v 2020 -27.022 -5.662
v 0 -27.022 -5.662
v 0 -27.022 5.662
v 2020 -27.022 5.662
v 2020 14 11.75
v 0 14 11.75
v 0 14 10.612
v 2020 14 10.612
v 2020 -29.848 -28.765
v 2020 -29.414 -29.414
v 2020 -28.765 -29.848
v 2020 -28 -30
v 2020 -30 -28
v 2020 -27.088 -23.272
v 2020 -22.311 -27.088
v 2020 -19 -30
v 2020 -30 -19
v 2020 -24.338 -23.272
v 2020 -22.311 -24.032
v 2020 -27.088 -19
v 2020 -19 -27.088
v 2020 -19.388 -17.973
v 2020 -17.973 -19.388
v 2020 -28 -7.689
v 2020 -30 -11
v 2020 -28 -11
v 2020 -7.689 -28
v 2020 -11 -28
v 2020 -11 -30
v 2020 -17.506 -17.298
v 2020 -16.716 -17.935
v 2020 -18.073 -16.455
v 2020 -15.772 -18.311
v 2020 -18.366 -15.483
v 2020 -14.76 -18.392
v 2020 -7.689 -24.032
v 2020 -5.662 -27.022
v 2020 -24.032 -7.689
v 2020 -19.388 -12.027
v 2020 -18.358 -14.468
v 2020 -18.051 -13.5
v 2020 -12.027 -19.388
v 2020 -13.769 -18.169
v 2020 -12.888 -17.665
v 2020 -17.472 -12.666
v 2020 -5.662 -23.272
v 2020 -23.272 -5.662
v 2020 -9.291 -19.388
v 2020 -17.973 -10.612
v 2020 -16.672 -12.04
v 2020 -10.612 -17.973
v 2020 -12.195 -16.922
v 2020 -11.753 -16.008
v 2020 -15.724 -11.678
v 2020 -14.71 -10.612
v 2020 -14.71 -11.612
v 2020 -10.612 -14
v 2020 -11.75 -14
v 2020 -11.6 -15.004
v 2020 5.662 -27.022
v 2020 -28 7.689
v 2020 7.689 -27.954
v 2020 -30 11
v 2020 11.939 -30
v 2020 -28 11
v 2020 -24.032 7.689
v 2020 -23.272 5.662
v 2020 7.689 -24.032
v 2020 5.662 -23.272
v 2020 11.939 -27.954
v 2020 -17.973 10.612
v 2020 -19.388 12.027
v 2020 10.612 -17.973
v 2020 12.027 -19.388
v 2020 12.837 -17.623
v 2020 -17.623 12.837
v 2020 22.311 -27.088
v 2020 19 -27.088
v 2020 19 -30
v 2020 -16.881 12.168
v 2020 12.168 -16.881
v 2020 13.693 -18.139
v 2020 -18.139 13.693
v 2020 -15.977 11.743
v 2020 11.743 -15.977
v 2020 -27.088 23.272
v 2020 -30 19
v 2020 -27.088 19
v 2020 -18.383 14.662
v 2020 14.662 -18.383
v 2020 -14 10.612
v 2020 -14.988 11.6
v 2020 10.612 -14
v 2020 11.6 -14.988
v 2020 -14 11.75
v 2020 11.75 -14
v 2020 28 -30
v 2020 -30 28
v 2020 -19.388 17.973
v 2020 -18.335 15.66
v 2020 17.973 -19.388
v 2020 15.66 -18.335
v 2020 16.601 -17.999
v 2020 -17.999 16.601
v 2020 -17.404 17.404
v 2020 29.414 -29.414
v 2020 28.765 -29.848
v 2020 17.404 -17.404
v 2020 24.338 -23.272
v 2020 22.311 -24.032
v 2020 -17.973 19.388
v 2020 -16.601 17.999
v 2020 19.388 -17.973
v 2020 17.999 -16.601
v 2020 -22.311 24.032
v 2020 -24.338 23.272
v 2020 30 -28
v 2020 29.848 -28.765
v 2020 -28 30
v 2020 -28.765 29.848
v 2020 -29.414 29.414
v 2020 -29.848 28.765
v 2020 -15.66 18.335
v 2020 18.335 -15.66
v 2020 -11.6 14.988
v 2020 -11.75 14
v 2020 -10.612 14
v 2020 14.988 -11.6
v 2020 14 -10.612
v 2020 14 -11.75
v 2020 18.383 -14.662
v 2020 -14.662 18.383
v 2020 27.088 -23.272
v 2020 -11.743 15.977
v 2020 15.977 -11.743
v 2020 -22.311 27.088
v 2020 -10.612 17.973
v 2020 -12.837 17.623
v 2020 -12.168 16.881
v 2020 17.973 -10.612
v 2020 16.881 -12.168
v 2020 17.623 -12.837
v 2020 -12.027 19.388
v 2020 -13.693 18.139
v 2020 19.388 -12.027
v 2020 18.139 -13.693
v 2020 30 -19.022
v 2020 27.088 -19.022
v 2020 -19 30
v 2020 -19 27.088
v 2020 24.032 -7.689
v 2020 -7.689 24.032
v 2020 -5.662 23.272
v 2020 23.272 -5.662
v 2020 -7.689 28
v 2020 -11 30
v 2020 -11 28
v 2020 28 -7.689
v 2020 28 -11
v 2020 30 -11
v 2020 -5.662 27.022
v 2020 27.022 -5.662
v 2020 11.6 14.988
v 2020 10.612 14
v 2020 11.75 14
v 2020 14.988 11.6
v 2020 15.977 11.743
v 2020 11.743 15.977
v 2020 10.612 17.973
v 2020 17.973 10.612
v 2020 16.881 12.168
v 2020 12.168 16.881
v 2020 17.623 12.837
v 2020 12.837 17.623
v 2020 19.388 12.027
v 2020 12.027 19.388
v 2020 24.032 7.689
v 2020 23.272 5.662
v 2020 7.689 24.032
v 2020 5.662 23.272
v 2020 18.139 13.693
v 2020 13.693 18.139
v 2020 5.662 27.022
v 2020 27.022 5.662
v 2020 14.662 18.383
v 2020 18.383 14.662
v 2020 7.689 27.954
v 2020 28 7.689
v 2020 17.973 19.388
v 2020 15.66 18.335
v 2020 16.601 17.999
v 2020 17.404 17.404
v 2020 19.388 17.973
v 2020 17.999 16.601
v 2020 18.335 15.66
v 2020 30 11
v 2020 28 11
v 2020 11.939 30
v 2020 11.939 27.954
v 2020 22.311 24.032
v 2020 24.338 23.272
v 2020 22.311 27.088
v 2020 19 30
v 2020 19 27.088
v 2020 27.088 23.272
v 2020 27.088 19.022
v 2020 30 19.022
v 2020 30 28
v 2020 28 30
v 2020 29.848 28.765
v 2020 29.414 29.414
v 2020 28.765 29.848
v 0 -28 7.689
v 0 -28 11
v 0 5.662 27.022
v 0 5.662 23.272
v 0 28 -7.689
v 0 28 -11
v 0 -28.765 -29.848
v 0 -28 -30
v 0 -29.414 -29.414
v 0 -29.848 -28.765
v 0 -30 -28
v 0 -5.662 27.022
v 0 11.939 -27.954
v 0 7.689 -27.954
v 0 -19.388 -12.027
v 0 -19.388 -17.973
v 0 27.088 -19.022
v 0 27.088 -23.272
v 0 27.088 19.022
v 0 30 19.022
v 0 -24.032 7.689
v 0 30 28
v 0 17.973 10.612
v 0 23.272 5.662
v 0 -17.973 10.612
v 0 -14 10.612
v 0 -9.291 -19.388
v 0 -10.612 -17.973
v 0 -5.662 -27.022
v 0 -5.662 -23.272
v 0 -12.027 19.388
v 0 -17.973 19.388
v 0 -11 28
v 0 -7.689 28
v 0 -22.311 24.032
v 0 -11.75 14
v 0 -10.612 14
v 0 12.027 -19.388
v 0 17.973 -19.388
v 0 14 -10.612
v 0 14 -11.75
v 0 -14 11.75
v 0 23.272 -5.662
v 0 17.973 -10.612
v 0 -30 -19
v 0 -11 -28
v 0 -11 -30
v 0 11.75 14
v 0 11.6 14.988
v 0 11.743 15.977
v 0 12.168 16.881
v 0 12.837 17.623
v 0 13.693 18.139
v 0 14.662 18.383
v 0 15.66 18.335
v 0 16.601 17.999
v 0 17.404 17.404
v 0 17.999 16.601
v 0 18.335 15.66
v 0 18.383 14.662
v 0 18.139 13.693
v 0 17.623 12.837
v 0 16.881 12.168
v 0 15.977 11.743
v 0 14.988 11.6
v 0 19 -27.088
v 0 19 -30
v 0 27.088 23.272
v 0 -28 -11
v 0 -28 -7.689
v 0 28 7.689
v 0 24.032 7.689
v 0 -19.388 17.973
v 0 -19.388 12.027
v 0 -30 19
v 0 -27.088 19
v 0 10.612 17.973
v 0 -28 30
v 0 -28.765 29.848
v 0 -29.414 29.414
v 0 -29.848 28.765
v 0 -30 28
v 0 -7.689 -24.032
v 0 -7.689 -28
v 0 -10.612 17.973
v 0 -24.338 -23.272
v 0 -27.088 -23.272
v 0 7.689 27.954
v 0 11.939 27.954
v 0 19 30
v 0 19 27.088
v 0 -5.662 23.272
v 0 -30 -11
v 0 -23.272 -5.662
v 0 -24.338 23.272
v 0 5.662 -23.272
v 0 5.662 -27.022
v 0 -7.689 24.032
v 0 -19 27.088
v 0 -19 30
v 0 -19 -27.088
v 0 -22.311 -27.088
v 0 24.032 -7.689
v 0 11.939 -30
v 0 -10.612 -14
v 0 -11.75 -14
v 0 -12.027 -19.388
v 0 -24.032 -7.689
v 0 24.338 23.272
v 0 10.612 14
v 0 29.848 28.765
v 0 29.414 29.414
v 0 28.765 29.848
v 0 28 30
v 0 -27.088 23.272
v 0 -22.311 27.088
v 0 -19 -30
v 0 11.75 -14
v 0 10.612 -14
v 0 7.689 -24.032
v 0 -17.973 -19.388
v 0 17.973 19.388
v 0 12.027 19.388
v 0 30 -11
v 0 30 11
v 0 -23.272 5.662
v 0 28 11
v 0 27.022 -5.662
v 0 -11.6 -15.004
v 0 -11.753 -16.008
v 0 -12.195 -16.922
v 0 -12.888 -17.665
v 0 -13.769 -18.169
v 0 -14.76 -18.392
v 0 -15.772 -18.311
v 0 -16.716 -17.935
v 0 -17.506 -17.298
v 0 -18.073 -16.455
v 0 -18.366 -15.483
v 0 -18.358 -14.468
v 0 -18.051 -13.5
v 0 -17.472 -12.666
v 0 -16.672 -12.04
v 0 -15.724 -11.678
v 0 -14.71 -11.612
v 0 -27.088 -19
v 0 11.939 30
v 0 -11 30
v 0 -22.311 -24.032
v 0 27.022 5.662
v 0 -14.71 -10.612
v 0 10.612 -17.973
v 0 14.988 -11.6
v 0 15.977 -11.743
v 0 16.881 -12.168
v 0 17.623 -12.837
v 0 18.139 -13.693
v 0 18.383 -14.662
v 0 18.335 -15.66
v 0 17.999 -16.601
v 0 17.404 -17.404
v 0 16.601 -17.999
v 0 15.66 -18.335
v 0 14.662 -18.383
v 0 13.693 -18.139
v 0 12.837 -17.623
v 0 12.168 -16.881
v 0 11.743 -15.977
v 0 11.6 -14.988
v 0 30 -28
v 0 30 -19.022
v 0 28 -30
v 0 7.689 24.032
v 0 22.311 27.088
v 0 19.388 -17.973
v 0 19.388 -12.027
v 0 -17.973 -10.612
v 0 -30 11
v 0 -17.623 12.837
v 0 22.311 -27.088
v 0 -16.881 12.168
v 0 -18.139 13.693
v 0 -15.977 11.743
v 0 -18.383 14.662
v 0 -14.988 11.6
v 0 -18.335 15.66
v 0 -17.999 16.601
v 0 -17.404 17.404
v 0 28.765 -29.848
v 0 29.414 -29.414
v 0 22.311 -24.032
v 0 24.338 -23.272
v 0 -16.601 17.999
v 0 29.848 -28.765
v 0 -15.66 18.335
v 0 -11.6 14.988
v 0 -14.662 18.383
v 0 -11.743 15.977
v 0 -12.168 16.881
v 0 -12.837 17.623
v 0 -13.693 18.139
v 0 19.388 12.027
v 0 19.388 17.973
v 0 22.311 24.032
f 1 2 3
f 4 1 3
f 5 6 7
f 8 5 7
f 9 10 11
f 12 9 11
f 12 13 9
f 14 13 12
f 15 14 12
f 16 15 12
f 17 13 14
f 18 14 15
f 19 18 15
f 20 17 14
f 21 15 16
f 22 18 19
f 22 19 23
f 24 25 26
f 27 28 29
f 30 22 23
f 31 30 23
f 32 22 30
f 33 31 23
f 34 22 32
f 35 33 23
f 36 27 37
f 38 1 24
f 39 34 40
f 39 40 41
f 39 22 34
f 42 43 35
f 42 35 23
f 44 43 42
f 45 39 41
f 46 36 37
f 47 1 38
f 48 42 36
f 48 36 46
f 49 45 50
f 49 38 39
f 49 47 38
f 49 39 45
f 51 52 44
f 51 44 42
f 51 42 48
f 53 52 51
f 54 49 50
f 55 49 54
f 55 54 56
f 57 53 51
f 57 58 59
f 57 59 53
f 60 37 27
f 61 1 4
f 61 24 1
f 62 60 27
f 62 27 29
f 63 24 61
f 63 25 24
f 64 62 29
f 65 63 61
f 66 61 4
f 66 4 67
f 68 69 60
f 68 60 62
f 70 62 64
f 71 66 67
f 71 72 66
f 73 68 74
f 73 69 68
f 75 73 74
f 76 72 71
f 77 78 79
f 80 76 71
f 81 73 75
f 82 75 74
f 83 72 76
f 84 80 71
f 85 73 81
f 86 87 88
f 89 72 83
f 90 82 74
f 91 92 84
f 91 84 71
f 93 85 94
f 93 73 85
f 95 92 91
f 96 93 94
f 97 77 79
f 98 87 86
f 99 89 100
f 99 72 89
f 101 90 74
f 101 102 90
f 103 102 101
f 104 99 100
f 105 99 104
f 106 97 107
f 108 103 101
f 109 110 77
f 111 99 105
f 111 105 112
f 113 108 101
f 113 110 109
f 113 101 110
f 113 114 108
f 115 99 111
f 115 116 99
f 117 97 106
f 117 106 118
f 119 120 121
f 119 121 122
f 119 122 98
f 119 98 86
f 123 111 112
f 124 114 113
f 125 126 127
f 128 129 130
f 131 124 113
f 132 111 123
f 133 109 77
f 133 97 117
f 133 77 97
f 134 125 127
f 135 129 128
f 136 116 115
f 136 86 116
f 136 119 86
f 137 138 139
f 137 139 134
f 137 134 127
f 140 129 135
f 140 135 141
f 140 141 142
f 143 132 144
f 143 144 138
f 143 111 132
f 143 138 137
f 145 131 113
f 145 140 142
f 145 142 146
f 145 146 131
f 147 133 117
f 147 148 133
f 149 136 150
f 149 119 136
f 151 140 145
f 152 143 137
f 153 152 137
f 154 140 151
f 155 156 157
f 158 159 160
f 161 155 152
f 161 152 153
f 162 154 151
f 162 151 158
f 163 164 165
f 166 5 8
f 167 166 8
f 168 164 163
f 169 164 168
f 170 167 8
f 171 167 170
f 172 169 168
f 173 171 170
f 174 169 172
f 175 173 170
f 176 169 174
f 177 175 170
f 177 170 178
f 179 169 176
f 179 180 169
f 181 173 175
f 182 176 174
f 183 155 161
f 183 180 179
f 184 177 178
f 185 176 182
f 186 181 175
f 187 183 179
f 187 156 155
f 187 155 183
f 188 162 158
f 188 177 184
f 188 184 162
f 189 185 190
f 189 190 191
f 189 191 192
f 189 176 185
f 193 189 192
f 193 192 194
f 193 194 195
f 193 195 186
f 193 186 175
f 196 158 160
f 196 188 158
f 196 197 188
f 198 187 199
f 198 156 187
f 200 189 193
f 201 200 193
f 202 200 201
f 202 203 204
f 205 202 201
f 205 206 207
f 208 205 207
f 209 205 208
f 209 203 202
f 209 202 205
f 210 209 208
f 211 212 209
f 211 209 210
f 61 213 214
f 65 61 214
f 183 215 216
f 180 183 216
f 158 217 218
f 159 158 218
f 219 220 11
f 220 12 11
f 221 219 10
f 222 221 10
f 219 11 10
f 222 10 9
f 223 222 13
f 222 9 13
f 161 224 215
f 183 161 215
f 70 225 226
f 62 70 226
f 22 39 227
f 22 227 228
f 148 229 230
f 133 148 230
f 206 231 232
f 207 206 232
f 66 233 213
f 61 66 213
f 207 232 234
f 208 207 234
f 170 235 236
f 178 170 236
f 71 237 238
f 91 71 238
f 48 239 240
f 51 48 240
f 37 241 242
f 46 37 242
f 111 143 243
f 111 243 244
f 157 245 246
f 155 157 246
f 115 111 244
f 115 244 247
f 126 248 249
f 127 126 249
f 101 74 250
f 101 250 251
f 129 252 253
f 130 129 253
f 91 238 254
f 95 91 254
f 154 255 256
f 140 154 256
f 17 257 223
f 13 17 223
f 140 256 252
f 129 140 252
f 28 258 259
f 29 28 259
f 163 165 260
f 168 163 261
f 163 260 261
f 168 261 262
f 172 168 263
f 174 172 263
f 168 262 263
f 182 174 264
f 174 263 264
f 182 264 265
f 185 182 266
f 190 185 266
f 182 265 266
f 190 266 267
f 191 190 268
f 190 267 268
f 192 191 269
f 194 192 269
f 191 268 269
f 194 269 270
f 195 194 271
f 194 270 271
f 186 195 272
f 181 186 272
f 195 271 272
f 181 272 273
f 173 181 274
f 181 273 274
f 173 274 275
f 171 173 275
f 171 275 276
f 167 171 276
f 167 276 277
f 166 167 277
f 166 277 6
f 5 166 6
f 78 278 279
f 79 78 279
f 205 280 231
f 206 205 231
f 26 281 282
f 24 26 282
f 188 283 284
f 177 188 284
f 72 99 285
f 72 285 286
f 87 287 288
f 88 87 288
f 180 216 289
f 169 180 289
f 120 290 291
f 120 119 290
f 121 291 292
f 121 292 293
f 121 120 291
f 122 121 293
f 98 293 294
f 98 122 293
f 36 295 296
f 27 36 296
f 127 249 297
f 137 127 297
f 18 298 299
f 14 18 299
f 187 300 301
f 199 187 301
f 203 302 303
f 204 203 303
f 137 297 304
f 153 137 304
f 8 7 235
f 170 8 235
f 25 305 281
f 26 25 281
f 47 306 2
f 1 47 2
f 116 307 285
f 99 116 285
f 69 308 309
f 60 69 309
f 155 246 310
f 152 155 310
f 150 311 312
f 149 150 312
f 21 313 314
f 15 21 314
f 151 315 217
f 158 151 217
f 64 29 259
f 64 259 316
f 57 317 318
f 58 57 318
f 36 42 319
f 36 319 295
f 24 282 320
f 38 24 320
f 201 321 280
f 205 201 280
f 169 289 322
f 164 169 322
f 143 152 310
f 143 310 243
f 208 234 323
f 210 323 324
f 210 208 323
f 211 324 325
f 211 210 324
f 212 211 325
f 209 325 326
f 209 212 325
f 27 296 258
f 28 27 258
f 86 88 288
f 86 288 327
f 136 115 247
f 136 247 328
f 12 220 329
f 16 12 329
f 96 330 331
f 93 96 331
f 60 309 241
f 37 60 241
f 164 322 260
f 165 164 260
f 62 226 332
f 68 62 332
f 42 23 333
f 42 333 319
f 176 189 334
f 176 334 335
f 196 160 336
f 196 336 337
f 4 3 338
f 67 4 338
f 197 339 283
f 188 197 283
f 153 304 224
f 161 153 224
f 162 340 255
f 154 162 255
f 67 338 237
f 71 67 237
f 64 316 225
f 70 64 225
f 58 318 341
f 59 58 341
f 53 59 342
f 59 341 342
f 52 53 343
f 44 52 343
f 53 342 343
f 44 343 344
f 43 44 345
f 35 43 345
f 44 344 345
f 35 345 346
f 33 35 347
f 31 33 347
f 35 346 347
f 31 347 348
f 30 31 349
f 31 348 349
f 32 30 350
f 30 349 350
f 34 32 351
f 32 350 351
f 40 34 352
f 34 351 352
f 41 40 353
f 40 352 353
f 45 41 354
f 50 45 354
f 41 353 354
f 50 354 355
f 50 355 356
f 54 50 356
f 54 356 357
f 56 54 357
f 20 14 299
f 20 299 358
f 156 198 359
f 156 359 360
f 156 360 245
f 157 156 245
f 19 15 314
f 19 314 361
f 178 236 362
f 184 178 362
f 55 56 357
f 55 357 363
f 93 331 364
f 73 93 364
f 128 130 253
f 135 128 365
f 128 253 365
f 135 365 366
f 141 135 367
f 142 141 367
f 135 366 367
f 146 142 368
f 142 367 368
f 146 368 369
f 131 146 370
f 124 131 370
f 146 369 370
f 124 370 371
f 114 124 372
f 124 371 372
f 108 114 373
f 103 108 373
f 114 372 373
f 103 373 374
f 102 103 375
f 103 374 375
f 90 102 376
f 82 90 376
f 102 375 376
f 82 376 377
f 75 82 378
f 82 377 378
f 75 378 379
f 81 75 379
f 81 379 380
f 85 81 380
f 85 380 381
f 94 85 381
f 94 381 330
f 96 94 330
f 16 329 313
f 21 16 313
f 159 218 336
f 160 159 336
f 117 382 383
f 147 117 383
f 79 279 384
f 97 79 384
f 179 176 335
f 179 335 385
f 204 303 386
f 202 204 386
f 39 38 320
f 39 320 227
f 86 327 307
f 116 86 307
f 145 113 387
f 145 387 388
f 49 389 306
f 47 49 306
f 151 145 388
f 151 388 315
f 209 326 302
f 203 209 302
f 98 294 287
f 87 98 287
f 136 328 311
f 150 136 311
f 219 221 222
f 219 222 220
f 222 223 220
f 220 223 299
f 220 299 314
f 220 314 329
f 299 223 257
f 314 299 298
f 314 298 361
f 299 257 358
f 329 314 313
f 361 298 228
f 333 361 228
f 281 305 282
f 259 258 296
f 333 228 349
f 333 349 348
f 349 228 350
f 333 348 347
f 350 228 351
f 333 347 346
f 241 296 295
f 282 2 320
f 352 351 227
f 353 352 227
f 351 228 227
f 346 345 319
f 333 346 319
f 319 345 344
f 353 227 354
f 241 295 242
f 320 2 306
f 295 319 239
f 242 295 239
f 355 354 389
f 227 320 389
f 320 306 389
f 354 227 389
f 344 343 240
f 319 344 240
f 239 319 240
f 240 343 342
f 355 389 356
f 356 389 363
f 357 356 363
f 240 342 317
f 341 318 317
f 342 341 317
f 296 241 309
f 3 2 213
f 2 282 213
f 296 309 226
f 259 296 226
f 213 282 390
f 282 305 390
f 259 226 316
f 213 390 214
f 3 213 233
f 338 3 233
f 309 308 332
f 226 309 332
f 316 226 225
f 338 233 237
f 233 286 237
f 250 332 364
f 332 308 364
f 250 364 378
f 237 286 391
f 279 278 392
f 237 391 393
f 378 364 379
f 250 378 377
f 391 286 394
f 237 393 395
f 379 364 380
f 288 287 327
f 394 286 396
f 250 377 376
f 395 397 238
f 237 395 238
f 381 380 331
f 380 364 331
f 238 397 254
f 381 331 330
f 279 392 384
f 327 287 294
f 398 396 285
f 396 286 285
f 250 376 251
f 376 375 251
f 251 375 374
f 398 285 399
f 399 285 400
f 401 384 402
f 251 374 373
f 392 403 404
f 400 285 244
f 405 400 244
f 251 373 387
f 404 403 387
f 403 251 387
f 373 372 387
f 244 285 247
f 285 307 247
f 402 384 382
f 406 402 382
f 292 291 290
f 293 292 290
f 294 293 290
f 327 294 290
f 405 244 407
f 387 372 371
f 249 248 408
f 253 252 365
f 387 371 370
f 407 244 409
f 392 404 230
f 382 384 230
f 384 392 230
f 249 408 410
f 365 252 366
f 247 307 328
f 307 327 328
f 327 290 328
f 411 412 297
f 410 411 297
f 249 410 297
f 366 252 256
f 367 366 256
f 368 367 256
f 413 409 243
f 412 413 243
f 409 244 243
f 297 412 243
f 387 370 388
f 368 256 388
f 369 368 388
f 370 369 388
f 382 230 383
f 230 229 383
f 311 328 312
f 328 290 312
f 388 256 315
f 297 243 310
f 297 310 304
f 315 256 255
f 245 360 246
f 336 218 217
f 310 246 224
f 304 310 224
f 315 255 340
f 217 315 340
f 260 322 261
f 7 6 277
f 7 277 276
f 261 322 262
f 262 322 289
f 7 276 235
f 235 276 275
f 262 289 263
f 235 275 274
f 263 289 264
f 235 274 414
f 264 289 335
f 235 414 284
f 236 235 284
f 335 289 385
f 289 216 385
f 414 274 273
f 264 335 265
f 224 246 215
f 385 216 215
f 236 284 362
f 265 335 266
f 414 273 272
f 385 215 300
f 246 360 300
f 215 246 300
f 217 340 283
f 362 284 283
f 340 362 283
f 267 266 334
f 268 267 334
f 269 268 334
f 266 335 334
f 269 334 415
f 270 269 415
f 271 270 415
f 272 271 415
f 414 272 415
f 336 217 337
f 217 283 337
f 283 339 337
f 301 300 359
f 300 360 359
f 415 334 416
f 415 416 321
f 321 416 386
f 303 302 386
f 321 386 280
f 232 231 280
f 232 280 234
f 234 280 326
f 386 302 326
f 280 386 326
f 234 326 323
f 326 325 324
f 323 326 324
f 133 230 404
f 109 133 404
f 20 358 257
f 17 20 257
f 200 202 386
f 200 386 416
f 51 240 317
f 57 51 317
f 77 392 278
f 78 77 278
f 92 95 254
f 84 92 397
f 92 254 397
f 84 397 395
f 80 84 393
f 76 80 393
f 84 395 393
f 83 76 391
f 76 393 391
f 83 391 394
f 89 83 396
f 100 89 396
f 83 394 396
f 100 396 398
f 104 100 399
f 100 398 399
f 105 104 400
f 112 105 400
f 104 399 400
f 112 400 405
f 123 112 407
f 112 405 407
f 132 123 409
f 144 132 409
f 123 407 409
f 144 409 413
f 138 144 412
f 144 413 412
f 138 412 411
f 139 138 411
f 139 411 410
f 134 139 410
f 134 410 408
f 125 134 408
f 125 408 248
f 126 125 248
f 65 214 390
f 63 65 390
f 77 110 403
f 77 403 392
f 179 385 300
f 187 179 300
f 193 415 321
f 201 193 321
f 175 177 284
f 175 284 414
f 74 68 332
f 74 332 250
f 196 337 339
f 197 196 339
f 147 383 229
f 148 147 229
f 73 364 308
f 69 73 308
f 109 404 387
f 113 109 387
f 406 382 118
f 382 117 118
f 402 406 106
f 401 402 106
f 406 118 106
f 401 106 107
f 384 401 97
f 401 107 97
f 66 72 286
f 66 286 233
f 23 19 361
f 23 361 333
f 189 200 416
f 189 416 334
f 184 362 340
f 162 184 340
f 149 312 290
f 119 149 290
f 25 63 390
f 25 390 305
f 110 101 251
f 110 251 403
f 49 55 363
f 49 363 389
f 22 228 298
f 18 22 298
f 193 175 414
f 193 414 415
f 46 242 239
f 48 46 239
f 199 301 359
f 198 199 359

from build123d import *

# Parameters (mm, degrees)
F1_DEPTH = 2020
F2_R     = 2


with BuildPart() as f1:
    # F0 (on Right) → F1 (new body)
    with BuildSketch(Plane.YZ):
        with BuildLine():
            Line((-10.612364, -17.972602), (-9.290568, -19.387636))
            Line((-9.290568, -19.387636), (-5.661865, -23.272303))
            Line((-5.661865, -23.272303), (-5.661865, -27.022303))
            Line((-5.661865, -27.022303), (5.661865, -27.022303))
            Line((5.661865, -27.022303), (5.661865, -23.272303))
            Line((5.661865, -23.272303), (10.612364, -17.972602))
            Line((10.612364, -17.972602), (10.612364, -14))
            Line((10.612364, -14), (11.750385, -14))
            ThreePointArc((11.750385, -14), (17.404163, -17.404163), (14, -11.750385))
            Line((14, -11.750385), (14, -10.612364))
            Line((14, -10.612364), (17.972602, -10.612364))
            Line((17.972602, -10.612364), (23.272303, -5.661865))
            Line((23.272303, -5.661865), (27.022303, -5.661865))
            Line((27.022303, -5.661865), (27.022303, 5.661865))
            Line((27.022303, 5.661865), (23.272303, 5.661865))
            Line((23.272303, 5.661865), (17.972602, 10.612364))
            Line((17.972602, 10.612364), (14, 10.612364))
            Line((14, 10.612364), (14, 11.750385))
            ThreePointArc((14, 11.750385), (17.404163, 17.404163), (11.750385, 14))
            Line((11.750385, 14), (10.612364, 14))
            Line((10.612364, 14), (10.612364, 17.972602))
            Line((10.612364, 17.972602), (5.661865, 23.272303))
            Line((5.661865, 23.272303), (5.661865, 27.022303))
            Line((5.661865, 27.022303), (-5.661865, 27.022303))
            Line((-5.661865, 27.022303), (-5.661865, 23.272303))
            Line((-5.661865, 23.272303), (-10.612364, 17.972602))
            Line((-10.612364, 17.972602), (-10.612364, 14))
            Line((-10.612364, 14), (-11.750385, 14))
            ThreePointArc((-11.750385, 14), (-17.404163, 17.404163), (-14, 11.750385))
            Line((-14, 11.750385), (-14, 10.612364))
            Line((-14, 10.612364), (-17.972602, 10.612364))
            Line((-17.972602, 10.612364), (-23.272303, 5.661865))
            Line((-23.272303, 5.661865), (-27.022303, 5.661865))
            Line((-27.022303, 5.661865), (-27.022303, -5.661865))
            Line((-27.022303, -5.661865), (-23.272303, -5.661865))
            Line((-23.272303, -5.661865), (-17.972602, -10.612364))
            Line((-17.972602, -10.612364), (-14.710301, -10.612364))
            Line((-14.710301, -10.612364), (-14.710301, -11.612364))
            ThreePointArc((-14.710301, -11.612364), (-17.134687, -17.646339), (-11.750385, -14))
            Line((-11.750385, -14), (-10.612364, -14))
            Line((-10.612364, -14), (-10.612364, -17.972602))
        make_face()
        Polygon((30, 19.022303), (30, 30), (19, 30), (19, 27.088135), (22.311088, 27.088135), (22.311088, 24.032154), (17.972602, 19.387636), (14.198971, 19.387636), (12.027398, 19.387636), (7.688912, 24.032154), (7.688912, 26.953727), (7.688912, 27.953727), (11.938912, 27.953727), (11.938912, 30), (-11, 30), (-11, 28), (-7.688912, 28), (-7.688912, 24.032154), (-12.027398, 19.387636), (-17.972602, 19.387636), (-22.311088, 24.032154), (-22.311088, 27.088135), (-19, 27.088135), (-19, 30), (-30, 30), (-30, 19), (-27.088135, 19), (-27.088135, 23.272303), (-24.338135, 23.272303), (-19.387636, 17.972602), (-19.387636, 12.027398), (-24.032154, 7.688912), (-28, 7.688912), (-28, 11), (-30, 11), (-30, -11), (-28, -11), (-28, -7.688912), (-24.032154, -7.688912), (-19.387636, -12.027398), (-19.387636, -17.972602), (-24.338135, -23.272303), (-27.088135, -23.272303), (-27.088135, -19), (-30, -19), (-30, -30), (-19, -30), (-19, -27.088135), (-22.311088, -27.088135), (-22.311088, -24.032154), (-17.972602, -19.387636), (-12.027398, -19.387636), (-7.688912, -24.032154), (-7.688912, -28), (-11, -28), (-11, -30), (11.938912, -30), (11.938912, -27.953727), (7.688912, -27.953727), (7.688912, -26.953727), (7.688912, -24.032154), (12.027398, -19.387636), (14.198971, -19.387636), (17.972602, -19.387636), (22.311088, -24.032154), (22.311088, -27.088135), (19, -27.088135), (19, -30), (30, -30), (30, -19.022303), (27.088135, -19.022303), (27.088135, -23.272303), (24.338135, -23.272303), (19.387636, -17.972602), (19.387636, -12.027398), (24.032154, -7.688912), (28, -7.688912), (28, -11), (30, -11), (30, 11), (28, 11), (28, 7.688912), (24.032154, 7.688912), (19.387636, 12.027398), (19.387636, 17.972602), (24.338135, 23.272303), (27.088135, 23.272303), (27.088135, 19.022303), align=None)
        with BuildLine():
            Line((-5.661865, -23.272303), (-9.290568, -19.387636))
            Line((-9.290568, -19.387636), (-10.612364, -17.972602))
            Line((-10.612364, -17.972602), (-10.612364, -14))
            Line((-10.612364, -14), (-11.750385, -14))
            ThreePointArc((-11.750385, -14), (-17.134687, -17.646339), (-14.710301, -11.612364))
            Line((-14.710301, -11.612364), (-14.710301, -10.612364))
            Line((-14.710301, -10.612364), (-17.972602, -10.612364))
            Line((-17.972602, -10.612364), (-23.272303, -5.661865))
            Line((-23.272303, -5.661865), (-27.022303, -5.661865))
            Line((-27.022303, -5.661865), (-27.022303, 5.661865))
            Line((-27.022303, 5.661865), (-23.272303, 5.661865))
            Line((-23.272303, 5.661865), (-17.972602, 10.612364))
            Line((-17.972602, 10.612364), (-14, 10.612364))
            Line((-14, 10.612364), (-14, 11.750385))
            ThreePointArc((-14, 11.750385), (-17.404163, 17.404163), (-11.750385, 14))
            Line((-11.750385, 14), (-10.612364, 14))
            Line((-10.612364, 14), (-10.612364, 17.972602))
            Line((-10.612364, 17.972602), (-5.661865, 23.272303))
            Line((-5.661865, 23.272303), (-5.661865, 27.022303))
            Line((-5.661865, 27.022303), (5.661865, 27.022303))
            Line((5.661865, 27.022303), (5.661865, 23.272303))
            Line((5.661865, 23.272303), (10.612364, 17.972602))
            Line((10.612364, 17.972602), (10.612364, 14))
            Line((10.612364, 14), (11.750385, 14))
            ThreePointArc((11.750385, 14), (17.404163, 17.404163), (14, 11.750385))
            Line((14, 11.750385), (14, 10.612364))
            Line((14, 10.612364), (17.972602, 10.612364))
            Line((17.972602, 10.612364), (23.272303, 5.661865))
            Line((23.272303, 5.661865), (27.022303, 5.661865))
            Line((27.022303, 5.661865), (27.022303, -5.661865))
            Line((27.022303, -5.661865), (23.272303, -5.661865))
            Line((23.272303, -5.661865), (17.972602, -10.612364))
            Line((17.972602, -10.612364), (14, -10.612364))
            Line((14, -10.612364), (14, -11.750385))
            ThreePointArc((14, -11.750385), (17.404163, -17.404163), (11.750385, -14))
            Line((11.750385, -14), (10.612364, -14))
            Line((10.612364, -14), (10.612364, -17.972602))
            Line((10.612364, -17.972602), (5.661865, -23.272303))
            Line((5.661865, -23.272303), (5.661865, -27.022303))
            Line((5.661865, -27.022303), (-5.661865, -27.022303))
            Line((-5.661865, -27.022303), (-5.661865, -23.272303))
        make_face(mode=Mode.SUBTRACT)
    extrude(amount=F1_DEPTH)

    # F2
    f2_edges = [f1.edges().sort_by_distance(p)[0] for p in [
        (1010, -30, 30),
        (1010, 30, 30),
        (1010, 30, -30),
        (1010, -30, -30),
    ]]
    fillet(f2_edges, radius=F2_R)


solid = f1.part
